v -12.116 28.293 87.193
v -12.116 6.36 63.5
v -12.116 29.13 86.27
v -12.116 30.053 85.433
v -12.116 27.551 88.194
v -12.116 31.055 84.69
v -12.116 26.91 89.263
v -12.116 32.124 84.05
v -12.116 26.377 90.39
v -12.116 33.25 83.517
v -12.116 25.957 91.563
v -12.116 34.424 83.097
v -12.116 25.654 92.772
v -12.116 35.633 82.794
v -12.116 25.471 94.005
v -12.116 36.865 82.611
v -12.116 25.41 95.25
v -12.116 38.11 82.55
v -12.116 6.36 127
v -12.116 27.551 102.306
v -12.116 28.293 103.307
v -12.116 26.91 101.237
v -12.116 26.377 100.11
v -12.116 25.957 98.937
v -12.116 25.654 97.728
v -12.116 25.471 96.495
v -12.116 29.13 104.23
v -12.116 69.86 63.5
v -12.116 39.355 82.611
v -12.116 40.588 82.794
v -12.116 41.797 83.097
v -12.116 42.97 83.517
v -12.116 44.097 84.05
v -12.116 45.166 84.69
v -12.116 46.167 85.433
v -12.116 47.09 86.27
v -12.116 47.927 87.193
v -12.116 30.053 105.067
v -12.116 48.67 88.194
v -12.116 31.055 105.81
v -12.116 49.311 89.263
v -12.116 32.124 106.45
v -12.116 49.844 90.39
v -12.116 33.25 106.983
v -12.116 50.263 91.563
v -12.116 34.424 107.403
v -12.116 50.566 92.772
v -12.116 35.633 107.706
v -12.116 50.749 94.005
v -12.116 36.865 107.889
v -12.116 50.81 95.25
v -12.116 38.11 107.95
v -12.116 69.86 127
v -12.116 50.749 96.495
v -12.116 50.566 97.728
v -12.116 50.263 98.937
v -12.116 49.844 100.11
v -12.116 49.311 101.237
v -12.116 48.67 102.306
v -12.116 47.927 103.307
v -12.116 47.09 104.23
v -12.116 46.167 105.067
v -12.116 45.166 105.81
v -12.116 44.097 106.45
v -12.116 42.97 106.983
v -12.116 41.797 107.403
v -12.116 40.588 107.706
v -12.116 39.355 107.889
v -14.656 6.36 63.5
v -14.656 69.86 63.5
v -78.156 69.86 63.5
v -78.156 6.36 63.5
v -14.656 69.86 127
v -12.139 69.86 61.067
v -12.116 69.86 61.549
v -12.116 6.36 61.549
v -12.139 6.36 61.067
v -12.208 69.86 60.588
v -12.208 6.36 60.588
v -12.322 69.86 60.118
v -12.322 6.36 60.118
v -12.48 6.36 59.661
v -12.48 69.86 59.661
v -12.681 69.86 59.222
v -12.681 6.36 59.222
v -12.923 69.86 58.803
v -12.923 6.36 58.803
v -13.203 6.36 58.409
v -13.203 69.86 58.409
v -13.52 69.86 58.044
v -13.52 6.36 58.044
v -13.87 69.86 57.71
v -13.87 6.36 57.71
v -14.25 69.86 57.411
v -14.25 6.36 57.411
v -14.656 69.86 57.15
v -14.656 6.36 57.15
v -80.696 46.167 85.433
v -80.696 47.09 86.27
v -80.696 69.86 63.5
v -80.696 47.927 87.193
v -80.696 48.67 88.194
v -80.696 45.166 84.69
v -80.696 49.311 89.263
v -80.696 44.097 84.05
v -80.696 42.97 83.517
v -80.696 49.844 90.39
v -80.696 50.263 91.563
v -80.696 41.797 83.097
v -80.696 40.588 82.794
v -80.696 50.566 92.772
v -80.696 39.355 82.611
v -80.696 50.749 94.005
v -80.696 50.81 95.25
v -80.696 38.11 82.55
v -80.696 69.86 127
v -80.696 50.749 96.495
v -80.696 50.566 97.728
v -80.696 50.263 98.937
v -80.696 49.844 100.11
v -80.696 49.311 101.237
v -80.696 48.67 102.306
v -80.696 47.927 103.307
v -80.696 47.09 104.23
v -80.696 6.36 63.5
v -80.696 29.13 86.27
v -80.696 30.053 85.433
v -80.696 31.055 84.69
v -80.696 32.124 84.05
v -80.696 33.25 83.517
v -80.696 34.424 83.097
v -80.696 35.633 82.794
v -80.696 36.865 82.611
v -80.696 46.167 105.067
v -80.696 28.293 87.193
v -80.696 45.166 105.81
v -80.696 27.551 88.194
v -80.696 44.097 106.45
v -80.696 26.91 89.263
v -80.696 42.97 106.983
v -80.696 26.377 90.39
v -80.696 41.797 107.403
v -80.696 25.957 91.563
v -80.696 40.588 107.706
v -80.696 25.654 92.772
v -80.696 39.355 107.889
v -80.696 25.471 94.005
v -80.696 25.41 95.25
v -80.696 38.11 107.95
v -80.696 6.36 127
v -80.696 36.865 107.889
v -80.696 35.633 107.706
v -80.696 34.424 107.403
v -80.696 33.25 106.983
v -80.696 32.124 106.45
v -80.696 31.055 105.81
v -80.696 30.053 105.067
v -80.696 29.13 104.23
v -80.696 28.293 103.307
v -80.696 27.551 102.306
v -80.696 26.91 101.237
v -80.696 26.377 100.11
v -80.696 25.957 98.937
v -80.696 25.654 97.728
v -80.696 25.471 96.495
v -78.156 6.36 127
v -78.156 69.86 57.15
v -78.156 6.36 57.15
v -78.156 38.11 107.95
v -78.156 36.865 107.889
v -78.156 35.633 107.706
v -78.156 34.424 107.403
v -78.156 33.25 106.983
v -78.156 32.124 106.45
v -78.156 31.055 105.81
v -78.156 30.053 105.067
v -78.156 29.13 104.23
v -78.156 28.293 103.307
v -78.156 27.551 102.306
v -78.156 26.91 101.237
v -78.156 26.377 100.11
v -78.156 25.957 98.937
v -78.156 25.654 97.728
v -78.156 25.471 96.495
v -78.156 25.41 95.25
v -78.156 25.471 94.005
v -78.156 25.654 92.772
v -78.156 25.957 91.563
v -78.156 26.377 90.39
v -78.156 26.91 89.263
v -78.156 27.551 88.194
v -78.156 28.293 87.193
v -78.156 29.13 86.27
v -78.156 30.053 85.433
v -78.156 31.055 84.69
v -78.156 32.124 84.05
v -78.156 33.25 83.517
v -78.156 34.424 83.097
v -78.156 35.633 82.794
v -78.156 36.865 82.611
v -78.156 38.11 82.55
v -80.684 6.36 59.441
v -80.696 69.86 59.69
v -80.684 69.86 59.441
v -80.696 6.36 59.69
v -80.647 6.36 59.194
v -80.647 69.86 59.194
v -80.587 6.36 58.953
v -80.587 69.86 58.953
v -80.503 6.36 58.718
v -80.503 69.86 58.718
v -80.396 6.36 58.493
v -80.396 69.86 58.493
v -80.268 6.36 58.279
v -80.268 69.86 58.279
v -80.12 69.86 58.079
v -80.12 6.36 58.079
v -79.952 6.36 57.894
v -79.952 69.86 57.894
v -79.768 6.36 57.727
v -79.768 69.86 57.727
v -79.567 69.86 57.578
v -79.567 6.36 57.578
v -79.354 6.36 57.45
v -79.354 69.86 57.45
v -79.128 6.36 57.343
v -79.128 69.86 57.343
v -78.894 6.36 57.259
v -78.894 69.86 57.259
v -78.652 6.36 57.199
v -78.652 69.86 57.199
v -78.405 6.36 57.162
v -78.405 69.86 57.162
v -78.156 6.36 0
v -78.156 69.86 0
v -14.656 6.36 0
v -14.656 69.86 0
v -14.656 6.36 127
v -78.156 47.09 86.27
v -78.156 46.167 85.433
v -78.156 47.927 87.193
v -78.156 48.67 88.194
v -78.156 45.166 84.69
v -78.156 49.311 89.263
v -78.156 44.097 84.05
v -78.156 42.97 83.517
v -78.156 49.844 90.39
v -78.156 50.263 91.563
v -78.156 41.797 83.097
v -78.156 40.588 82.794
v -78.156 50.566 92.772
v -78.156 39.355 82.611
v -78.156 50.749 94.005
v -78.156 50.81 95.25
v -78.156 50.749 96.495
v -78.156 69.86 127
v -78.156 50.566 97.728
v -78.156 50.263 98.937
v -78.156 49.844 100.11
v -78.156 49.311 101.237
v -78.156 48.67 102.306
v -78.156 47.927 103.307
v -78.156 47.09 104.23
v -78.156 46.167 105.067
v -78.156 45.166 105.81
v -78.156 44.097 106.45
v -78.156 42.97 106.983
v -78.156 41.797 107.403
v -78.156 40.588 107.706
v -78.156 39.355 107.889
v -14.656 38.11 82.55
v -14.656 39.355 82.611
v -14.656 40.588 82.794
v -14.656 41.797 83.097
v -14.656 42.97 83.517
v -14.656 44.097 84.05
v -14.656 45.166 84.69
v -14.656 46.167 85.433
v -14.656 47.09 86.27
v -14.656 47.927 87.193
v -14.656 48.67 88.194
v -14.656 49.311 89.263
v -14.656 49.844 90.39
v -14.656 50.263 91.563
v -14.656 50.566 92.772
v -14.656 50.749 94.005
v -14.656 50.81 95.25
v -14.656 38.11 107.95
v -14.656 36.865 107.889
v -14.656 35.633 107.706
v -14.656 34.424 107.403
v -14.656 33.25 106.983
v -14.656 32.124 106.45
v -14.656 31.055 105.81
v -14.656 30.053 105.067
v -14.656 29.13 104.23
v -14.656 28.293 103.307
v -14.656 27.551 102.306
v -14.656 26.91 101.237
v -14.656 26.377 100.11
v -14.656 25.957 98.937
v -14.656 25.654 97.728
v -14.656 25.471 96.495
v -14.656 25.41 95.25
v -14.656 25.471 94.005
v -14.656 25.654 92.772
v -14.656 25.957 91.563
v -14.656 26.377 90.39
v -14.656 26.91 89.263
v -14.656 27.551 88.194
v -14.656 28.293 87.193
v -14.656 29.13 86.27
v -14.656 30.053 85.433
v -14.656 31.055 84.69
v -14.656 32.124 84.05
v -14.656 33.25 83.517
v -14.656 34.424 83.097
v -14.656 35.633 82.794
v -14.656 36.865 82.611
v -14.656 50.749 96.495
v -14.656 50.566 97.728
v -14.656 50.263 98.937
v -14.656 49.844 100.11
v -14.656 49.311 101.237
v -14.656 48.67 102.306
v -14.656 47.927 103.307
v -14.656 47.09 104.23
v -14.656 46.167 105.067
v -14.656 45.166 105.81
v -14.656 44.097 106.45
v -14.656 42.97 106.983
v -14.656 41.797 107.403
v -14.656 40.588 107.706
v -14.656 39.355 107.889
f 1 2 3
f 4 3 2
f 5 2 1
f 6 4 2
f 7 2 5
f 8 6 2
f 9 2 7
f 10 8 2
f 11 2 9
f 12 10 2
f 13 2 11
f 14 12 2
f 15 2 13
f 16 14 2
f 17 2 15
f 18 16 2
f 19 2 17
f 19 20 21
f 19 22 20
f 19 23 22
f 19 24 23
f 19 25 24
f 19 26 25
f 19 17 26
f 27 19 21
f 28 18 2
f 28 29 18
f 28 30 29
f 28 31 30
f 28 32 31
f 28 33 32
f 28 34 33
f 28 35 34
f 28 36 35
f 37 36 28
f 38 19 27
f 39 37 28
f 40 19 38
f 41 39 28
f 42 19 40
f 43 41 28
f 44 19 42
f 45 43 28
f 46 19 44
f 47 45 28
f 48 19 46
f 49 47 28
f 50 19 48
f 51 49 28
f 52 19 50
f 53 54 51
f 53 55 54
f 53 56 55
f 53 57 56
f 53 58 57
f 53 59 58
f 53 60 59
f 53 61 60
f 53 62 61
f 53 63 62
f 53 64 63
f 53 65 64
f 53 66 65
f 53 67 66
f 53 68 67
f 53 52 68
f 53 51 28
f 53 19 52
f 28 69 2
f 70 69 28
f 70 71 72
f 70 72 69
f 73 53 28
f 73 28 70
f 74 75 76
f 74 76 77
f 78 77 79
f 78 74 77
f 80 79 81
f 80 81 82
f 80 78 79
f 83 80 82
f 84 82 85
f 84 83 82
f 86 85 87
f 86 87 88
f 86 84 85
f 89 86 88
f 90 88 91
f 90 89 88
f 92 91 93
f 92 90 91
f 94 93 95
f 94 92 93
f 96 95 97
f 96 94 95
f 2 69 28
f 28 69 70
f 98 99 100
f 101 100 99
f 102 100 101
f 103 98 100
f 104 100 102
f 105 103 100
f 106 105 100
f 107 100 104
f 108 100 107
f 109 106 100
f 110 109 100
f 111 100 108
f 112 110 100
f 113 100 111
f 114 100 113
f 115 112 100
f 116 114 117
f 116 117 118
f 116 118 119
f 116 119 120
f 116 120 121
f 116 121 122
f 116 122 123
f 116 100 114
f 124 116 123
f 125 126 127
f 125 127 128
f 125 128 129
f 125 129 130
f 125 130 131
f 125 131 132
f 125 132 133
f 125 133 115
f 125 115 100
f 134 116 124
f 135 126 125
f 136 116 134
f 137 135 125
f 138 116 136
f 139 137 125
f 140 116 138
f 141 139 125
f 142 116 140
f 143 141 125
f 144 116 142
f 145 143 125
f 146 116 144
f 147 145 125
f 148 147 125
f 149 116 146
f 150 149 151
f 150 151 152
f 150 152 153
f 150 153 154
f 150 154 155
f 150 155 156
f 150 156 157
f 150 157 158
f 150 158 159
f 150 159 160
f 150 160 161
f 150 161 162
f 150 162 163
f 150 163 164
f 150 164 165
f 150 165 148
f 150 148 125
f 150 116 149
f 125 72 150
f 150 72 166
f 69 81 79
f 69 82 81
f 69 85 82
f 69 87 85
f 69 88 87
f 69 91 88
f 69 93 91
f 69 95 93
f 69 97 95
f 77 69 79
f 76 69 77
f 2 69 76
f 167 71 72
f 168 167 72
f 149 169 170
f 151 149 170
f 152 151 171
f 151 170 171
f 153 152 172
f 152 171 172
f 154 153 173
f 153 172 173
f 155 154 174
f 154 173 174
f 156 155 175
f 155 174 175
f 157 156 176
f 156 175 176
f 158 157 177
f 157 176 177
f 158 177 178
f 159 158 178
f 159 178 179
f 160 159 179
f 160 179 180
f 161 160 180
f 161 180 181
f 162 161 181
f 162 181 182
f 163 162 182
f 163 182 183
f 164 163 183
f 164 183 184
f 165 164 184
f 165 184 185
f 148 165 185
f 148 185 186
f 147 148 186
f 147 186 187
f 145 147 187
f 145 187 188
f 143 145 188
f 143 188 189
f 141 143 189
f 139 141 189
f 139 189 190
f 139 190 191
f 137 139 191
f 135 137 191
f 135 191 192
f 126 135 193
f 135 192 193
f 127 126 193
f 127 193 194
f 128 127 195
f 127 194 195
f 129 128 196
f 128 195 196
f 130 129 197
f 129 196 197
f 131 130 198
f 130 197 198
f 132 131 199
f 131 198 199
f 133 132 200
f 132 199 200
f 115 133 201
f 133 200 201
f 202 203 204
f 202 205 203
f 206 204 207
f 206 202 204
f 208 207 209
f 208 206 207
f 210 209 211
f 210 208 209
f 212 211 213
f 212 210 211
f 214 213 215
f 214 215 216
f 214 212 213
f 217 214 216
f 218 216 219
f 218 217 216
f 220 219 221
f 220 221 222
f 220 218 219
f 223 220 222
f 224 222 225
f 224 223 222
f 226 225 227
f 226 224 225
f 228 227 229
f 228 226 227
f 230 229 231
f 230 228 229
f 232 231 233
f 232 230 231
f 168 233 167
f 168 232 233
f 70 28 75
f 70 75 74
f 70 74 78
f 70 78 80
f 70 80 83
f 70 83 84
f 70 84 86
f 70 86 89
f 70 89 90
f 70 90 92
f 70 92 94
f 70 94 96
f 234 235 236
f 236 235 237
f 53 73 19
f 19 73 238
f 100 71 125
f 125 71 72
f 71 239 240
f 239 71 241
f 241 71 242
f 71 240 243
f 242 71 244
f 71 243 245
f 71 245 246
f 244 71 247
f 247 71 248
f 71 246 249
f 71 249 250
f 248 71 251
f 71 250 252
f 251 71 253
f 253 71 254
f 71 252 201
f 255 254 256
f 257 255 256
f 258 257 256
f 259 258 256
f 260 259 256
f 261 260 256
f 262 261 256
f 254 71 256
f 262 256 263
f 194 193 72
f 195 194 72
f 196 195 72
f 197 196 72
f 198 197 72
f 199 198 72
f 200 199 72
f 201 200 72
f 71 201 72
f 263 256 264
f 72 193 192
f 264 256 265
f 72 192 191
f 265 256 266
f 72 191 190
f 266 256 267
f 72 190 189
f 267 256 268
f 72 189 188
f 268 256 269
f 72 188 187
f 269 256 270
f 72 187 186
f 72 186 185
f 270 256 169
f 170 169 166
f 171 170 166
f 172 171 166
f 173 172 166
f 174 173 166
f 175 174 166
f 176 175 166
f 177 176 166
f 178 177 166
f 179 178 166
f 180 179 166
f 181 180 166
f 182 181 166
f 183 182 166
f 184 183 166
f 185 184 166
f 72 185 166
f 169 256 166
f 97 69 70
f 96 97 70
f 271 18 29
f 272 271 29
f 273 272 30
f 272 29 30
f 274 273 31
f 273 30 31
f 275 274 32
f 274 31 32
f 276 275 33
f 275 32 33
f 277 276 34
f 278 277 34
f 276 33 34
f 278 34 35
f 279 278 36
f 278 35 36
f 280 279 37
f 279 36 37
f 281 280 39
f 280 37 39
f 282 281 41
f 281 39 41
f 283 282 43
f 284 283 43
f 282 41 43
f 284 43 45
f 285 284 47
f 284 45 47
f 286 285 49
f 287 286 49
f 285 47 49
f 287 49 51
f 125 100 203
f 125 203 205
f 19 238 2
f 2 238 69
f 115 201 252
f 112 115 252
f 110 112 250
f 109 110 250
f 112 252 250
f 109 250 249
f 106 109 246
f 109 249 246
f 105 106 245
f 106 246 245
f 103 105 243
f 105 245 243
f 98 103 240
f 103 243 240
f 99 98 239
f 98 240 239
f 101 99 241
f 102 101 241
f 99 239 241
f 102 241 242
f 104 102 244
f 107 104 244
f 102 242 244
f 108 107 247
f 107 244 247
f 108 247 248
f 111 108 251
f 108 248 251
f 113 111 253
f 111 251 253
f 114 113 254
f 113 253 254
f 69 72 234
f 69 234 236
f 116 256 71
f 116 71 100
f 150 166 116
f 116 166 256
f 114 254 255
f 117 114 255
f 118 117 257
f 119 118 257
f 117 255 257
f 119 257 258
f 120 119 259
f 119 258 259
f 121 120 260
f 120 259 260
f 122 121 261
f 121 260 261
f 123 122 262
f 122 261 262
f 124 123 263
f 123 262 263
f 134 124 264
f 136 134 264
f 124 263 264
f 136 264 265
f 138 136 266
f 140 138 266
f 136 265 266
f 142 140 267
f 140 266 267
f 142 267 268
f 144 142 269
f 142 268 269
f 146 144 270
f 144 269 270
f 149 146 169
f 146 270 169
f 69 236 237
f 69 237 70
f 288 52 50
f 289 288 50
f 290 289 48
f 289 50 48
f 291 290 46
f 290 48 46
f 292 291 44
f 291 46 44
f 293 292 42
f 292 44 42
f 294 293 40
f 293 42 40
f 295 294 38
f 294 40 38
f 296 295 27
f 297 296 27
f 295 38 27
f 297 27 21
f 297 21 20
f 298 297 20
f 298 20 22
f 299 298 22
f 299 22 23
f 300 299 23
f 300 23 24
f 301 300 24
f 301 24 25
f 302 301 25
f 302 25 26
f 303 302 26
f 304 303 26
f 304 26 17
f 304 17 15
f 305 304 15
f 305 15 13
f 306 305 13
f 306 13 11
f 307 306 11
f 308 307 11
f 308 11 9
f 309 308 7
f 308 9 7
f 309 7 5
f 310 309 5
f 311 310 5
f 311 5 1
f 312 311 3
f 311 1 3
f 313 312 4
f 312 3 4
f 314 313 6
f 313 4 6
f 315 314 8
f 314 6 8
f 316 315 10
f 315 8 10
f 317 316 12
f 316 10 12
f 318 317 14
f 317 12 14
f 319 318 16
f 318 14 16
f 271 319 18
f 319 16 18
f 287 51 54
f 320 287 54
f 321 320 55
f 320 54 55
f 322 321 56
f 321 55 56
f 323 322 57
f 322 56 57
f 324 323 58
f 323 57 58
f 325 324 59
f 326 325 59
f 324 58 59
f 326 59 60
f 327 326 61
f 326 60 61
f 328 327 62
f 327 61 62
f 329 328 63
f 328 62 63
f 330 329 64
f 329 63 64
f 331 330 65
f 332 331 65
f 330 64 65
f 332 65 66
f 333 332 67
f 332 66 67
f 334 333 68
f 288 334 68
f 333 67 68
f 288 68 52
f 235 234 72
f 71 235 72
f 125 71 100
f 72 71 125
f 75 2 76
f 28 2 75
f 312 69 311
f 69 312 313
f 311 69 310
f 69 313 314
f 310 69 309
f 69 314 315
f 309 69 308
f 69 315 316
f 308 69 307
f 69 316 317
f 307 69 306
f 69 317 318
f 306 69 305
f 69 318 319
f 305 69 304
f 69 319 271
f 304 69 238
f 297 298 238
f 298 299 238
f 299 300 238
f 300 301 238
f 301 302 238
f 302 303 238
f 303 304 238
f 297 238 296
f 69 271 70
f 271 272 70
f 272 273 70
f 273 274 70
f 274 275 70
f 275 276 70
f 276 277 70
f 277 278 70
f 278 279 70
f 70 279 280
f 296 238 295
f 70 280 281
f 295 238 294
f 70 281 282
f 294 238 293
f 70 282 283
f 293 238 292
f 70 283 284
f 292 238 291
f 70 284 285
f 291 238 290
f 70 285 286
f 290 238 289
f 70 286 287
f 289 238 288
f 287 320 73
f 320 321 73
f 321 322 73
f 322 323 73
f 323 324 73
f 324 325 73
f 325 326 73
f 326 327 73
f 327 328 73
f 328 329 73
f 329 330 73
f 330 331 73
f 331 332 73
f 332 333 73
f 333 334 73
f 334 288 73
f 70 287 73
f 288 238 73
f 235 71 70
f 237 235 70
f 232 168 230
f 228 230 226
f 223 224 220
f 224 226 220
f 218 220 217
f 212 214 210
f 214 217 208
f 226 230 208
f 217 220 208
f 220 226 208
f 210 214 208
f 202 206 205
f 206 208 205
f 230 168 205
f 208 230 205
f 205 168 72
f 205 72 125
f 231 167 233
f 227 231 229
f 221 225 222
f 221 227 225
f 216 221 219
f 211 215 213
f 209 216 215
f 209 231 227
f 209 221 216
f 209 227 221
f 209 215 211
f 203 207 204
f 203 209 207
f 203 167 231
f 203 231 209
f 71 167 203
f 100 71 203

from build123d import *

# Parameters (mm, degrees)
F0_W         = 63.5
F0_H         = 63.5
F1_DEPTH     = 127
F2_W         = 63.5
F2_H         = 63.5
F3_DEPTH     = 2.54
F5_DEPTH     = 2.54
F7_DEPTH     = 2.54
F8_W         = 2.54
F8_H         = 63.5
F8_W_2       = 63.5
F9_DEPTH     = 2.54
F10_W        = 63.5
F10_H        = 63.5
F11_DEPTH    = 63.501
F12_DEPTH    = 6.35
F13_R        = 2.53999
F14_T1_DEPTH = 85.4970452561
F16_DEPTH    = 127
F18_DEPTH    = 25.4


# Not quite as in the source:
# - a fillet or chamfer that OpenCascade refuses, or shapes differently, is made with other operations: its cross-section is extruded or revolved along the edge and cut away or added
# - a fillet or chamfer is up to 0.001 mm smaller than in the source, because OpenCascade refuses the exact size


with BuildPart() as f1:
    # F0 (on Top) → F1 (new body)
    with BuildSketch(Plane.XY):
        with Locations((-46.4062093869, 38.1102421433)):
            Rectangle(F0_W, F0_H)
    extrude(amount=F1_DEPTH)

    # F2 (on face) → F3 (join)
    with BuildSketch(Plane(origin=(0, 69.8602421433, 0), x_dir=(-1, 0, 0), z_dir=(0, 1, 0))):
        with Locations((46.4062093869, 95.25)):
            Rectangle(F2_W, F2_H)
    extrude(amount=F3_DEPTH)


with BuildPart() as f5:
    # F4 (on face) → F5 (new body)
    with BuildSketch(Plane(origin=(-78.1562093869, 0, 0), x_dir=(0, -1, 0), z_dir=(-1, 0, 0))):
        Polygon((-6.3602421433, 127), (-72.4002421433, 127), (-72.4002421433, 63.5), (-69.8602421433, 63.5), (-6.3602421433, 63.5), align=None)
    extrude(amount=F5_DEPTH)


with BuildPart() as f7:
    # F6 (on face) → F7 (new body)
    with BuildSketch(Plane.YZ.offset(-14.6562093869)):
        Polygon((72.4002421433, 127), (6.3602421433, 127), (6.3602421433, 63.5), (69.8602421433, 63.5), (72.4002421433, 63.5), align=None)
    extrude(amount=F7_DEPTH)


with BuildPart() as f9_tool:
    # F8 (on face) → F9 (new body)
    with BuildSketch(Plane(origin=(0, 72.4002421433, 0), x_dir=(-1, 0, 0), z_dir=(0, 1, 0))):
        with Locations((13.3862093869, 95.25)):
            Rectangle(F8_W, F8_H)
        with Locations((46.4062093869, 95.25)):
            Rectangle(F8_W_2, F8_H)
        with Locations((79.4262093869, 95.25)):
            Rectangle(F8_W, F8_H)
    extrude(amount=-F9_DEPTH)


with BuildPart() as f1_1:
    add(f1.part)

    # F9: cut by f9_tool
    add(f9_tool.part, mode=Mode.SUBTRACT)

    # F10 (on face) → F11 (cut, through all)
    with BuildSketch(Plane.XZ.offset(-6.3602421433)):
        with Locations((-46.4062093869, 95.25)):
            Rectangle(F10_W, F10_H)
    extrude(amount=-F11_DEPTH, mode=Mode.SUBTRACT)

    # F17 (on face) → F18 (cut)
    with BuildSketch(Plane(origin=(-80.6962093869, 0, 0), x_dir=(0, -1, 0), z_dir=(-1, 0, 0))):
        with BuildLine():
            Line((-38.1102421433, 95.25), (-38.1102421433, 107.95))
            ThreePointArc((-38.1102421433, 107.95), (-47.0904982643, 104.2302561211), (-50.8102421433, 95.25))
            Line((-50.8102421433, 95.25), (-38.1102421433, 95.25))
        make_face()
        with BuildLine():
            Line((-38.1102421433, 95.25), (-50.8102421433, 95.25))
            ThreePointArc((-50.8102421433, 95.25), (-47.0904982643, 86.2697438789), (-38.1102421433, 82.55))
            Line((-38.1102421433, 82.55), (-38.1102421433, 95.25))
        make_face()
        with BuildLine():
            ThreePointArc((-25.4102421433, 95.25), (-29.1299860222, 104.2302561211), (-38.1102421433, 107.95))
            Line((-38.1102421433, 107.95), (-38.1102421433, 95.25))
            Line((-38.1102421433, 95.25), (-38.1102421433, 82.55))
            ThreePointArc((-38.1102421433, 82.55), (-29.1299860222, 86.2697438789), (-25.4102421433, 95.25))
        make_face()
    extrude(amount=-F18_DEPTH, mode=Mode.SUBTRACT)


with BuildPart() as f5_1:
    add(f5.part)

    # F9: cut by f9_tool
    add(f9_tool.part, mode=Mode.SUBTRACT)


with BuildPart() as f7_1:
    add(f7.part)

    # F9: cut by f9_tool
    add(f9_tool.part, mode=Mode.SUBTRACT)


with BuildPart() as f12:
    # F12 (new): a face of the model
    f12_faces = [f5_1.part.faces().sort_by_distance(p)[0] for p in [
        (-79.4262093869, 38.1102421433, 63.5),
    ]]
    extrude(f12_faces, amount=F12_DEPTH)

    # F13 (radius 2.54 in the source; OpenCascade refuses exactly that, so slightly less here)
    f13_edges = [f12.edges().sort_by_distance(p)[0] for p in [
        (-80.696209, 38.110242, 57.15),
    ]]
    fillet(f13_edges, radius=F13_R)


with BuildPart() as f12b:
    # F12#2 (new): a face of the model
    f12_2_faces = [f7_1.part.faces().sort_by_distance(p)[0] for p in [
        (-13.3862093869, 38.1102421433, 63.5),
    ]]
    extrude(f12_2_faces, amount=F12_DEPTH)

    # F14: fillet of radius 5.08 on 1 edges, made by hand

    # F14_s2 → F14_t1 (cut)
    with BuildSketch(Plane.XZ.offset(-80.8587647713)):
        with BuildLine():
            ThreePointArc((-12.1162093869, 61.5494090512), (-12.7968003357, 59.0094090512), (-14.6562093869, 57.15))
            Line((-14.6562093869, 57.15), (-12.1162093869, 57.15))
            Line((-12.1162093869, 57.15), (-12.1162093869, 61.5494090512))
        make_face()
    extrude(amount=F14_T1_DEPTH, mode=Mode.SUBTRACT)


with BuildPart() as f16_tool:
    # F15 (on face) → F16 (new body)
    with BuildSketch(Plane.YZ.offset(-12.1162093869)):
        with BuildLine():
            Line((38.1102421433, 95.25), (38.1102421433, 107.95))
            ThreePointArc((38.1102421433, 107.95), (25.4102421433, 95.25), (38.1102421433, 82.55))
            Line((38.1102421433, 82.55), (38.1102421433, 95.25))
        make_face()
        with BuildLine():
            ThreePointArc((50.8102421433, 95.25), (47.0904982643, 104.2302561211), (38.1102421433, 107.95))
            Line((38.1102421433, 107.95), (38.1102421433, 95.25))
            Line((38.1102421433, 95.25), (38.1102421433, 82.55))
            ThreePointArc((38.1102421433, 82.55), (47.0904982643, 86.2697438789), (50.8102421433, 95.25))
        make_face()
    extrude(amount=-F16_DEPTH)


with BuildPart() as f5_2:
    add(f5_1.part)

    # F16: cut by f16_tool
    add(f16_tool.part, mode=Mode.SUBTRACT)


with BuildPart() as f7_2:
    add(f7_1.part)

    # F16: cut by f16_tool
    add(f16_tool.part, mode=Mode.SUBTRACT)


solid = Compound([f1_1.part, f12.part, f12b.part, f5_2.part, f7_2.part])
